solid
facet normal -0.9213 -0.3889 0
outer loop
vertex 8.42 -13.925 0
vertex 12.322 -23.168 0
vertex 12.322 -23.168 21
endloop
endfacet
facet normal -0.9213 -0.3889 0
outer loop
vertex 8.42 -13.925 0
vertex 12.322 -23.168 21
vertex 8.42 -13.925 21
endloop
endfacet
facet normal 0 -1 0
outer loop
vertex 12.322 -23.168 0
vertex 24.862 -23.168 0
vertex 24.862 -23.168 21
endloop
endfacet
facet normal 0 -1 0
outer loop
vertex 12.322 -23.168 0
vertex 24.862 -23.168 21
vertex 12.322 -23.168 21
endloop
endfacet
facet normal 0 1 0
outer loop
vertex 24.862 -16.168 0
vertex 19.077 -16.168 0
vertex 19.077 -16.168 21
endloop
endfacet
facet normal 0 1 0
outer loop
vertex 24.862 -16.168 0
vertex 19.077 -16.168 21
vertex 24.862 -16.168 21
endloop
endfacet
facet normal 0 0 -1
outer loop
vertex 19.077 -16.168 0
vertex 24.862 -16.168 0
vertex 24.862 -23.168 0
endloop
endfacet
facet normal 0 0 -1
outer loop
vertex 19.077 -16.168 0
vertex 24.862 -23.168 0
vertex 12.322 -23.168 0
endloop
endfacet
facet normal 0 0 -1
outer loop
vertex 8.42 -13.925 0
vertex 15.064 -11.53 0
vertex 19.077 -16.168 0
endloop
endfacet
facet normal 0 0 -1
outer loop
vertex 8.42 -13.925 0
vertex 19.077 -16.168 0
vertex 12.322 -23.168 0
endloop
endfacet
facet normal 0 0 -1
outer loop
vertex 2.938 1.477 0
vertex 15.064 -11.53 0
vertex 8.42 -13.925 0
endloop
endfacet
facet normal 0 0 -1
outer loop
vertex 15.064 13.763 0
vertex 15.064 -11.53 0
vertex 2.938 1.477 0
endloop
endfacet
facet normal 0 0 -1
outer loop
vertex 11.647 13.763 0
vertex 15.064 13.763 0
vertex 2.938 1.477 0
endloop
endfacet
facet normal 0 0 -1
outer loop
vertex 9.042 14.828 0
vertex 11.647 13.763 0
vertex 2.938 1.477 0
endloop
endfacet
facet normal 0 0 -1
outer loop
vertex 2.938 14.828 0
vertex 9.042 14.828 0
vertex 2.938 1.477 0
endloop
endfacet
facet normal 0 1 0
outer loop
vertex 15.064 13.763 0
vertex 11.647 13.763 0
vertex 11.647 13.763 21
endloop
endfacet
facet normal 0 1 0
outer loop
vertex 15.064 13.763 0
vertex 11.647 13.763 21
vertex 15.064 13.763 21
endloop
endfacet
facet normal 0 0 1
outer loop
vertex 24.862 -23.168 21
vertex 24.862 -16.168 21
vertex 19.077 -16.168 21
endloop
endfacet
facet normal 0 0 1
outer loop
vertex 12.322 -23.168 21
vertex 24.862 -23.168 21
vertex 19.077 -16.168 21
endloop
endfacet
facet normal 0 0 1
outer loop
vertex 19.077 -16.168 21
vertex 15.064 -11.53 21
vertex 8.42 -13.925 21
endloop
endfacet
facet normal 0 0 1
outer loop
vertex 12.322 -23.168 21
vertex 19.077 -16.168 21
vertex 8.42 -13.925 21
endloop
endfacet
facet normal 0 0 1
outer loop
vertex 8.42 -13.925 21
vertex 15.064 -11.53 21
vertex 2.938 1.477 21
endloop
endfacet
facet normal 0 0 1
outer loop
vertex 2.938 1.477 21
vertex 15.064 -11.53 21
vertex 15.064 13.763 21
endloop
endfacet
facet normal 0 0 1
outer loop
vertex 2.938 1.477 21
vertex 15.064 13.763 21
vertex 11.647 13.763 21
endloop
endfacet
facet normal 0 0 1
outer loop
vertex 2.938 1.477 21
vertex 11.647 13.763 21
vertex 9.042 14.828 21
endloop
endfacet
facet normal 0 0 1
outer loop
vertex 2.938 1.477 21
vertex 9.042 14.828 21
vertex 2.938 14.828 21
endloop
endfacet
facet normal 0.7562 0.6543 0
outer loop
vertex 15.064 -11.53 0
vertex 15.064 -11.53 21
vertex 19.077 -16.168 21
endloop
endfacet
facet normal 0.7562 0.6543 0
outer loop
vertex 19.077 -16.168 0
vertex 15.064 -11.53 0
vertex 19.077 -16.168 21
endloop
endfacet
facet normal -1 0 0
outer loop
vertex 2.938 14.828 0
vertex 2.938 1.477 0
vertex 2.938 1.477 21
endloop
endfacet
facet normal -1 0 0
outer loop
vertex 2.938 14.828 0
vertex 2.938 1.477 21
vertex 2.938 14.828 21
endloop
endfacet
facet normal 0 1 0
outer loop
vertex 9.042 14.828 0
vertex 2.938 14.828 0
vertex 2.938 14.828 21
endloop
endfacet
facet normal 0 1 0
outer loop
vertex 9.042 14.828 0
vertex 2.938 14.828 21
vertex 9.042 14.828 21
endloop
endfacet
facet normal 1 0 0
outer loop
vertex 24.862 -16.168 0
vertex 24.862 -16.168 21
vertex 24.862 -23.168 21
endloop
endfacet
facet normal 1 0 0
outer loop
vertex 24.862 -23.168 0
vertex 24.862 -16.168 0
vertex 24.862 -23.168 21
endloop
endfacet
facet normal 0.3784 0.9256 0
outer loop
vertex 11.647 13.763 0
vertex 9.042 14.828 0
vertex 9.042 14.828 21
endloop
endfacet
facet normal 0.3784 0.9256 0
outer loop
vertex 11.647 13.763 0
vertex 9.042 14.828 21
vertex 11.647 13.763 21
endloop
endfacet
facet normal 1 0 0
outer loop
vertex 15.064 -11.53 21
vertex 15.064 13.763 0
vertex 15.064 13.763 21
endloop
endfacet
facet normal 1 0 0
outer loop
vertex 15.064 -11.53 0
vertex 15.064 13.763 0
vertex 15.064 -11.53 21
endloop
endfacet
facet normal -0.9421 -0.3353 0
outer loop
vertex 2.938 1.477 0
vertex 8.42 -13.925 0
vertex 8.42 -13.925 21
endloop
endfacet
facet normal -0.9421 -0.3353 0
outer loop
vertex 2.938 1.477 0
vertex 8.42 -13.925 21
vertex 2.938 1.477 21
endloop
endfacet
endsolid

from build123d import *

# Parameters (mm, degrees)
PAD_DEPTH = 21


with BuildPart() as part:
    # Sketch → Pad (new body)
    with BuildSketch(Plane.XY):
        Polygon((15.064161, 13.763299), (15.064161, -11.529544), (19.077391, -16.168041), (24.861727, -16.168041), (24.861727, -23.168041), (12.321744, -23.168041), (8.41961, -13.925244), (2.937834, 1.476605), (2.937834, 14.82831), (9.042294, 14.82831), (11.646651, 13.763299), align=None)
    extrude(amount=PAD_DEPTH)


solid = part.part
